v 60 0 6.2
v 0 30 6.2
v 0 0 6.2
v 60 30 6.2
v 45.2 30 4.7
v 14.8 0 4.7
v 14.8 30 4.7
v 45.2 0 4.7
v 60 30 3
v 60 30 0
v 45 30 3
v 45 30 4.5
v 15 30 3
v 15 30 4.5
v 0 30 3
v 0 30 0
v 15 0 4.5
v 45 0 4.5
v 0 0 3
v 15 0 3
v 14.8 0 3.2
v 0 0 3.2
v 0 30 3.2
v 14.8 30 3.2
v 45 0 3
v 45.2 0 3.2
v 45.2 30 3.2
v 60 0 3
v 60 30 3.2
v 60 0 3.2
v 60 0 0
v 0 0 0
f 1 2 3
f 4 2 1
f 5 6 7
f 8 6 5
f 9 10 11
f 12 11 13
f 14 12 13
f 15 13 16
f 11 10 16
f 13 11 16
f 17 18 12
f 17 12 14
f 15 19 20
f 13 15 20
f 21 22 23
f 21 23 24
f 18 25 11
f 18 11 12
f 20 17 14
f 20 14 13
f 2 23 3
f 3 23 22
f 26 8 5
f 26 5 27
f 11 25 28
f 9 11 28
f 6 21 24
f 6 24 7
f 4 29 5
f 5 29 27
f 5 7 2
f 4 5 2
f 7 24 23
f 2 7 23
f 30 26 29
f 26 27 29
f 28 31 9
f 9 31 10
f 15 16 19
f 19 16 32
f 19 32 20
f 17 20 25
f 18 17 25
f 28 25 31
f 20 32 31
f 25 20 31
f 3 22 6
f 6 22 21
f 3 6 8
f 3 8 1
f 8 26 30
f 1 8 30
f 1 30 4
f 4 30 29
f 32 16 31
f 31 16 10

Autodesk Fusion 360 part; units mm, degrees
sketch "Sketch2" plane through (0, 0, 0) normal (0, 0, 1) x (1, 0, 0)
  line L0 (0, 0) -> (60, 0)
  line L1 (60, 0) -> (60, 30)
  line L2 (60, 30) -> (0, 30)
  line L3 (0, 30) -> (0, 0)
  dimension "d8" = 60
  dimension "d9" = 30
extrude "Extrude5" add sketch "Sketch2" along normal blind 3 makes body 1
sketch "Sketch6" plane through (0, 0, 0) normal (0, 1, 0) x (1, 0, 0)
  line L0 (45, -4.5) -> (15, -4.5)
  line L1 (15, -4.5) -> (15, -1.5)
  line L2 (15, -1.5) -> (45, -1.5)
  line L3 (45, -1.5) -> (45, -4.5)
  line L4 (45, -4.5) -> (15, -1.5) construction
  line L5 (15, -4.5) -> (45, -1.5) construction
  line L6 (0, -3) -> (60, -3)
  point P0 (30, -3)
  dimension "d36" = 30
  dimension "d37" = 3
extrude "Extrude6" add sketch "Sketch6" along normal blind 30 contours L0 L1 L3 L6 bodies 1
ref_plane "WorkPlane2" through (0, 0, 3.2) normal (0, 0, 1) x (1, 0, 0)
sketch "Sketch7" plane through (0, 0, 3.2) normal (0, 0, 1) x (1, 0, 0)
  line L0 (0, 0) -> (60, 0)
  line L1 (60, 0) -> (60, 30)
  line L2 (60, 30) -> (0, 30)
  line L3 (0, 30) -> (0, 0)
  dimension "d41" = 60
  dimension "d42" = 30
extrude "Extrude7" add sketch "Sketch7" along normal blind 3 separate body makes body 2
sketch "Sketch8" plane through (0, 0, 0) normal (0, 1, 0) x (1, 0, 0)
  line L0 (45.2, -1.7) -> (14.8, -1.7)
  line L1 (14.8, -1.7) -> (14.8, -4.7)
  line L2 (14.8, -4.7) -> (45.2, -4.7)
  line L3 (45.2, -4.7) -> (45.2, -1.7)
  line L4 (45.2, -1.7) -> (14.8, -4.7) construction
  line L5 (14.8, -1.7) -> (45.2, -4.7) construction
  line L6 (0, -3.2) -> (60, -3.2)
  point P0 (30, -3.2)
  dimension "d45" = 30.4
  dimension "d46" = 3
extrude "Extrude8" cut sketch "Sketch8" along normal blind 30 contours L1 L2 L3 L6 bodies 2
equation "platelength = 60 mm"
equation "platewidth = 30 mm"
equation "plateheight = 3 mm"
equation "clearence = 0.2 mm"
equation "d8 = platelength"
equation "d9 = platewidth"
equation "d34 = plateheight"
equation "d37 = plateheight"
equation "d38 = platewidth"
equation "d40 = plateheight + clearence"
equation "d41 = platelength"
equation "d42 = platewidth"
equation "d43 = plateheight"
equation "d45 = 30 mm + ( 2 * clearence )"
equation "d46 = plateheight"
equation "d47 = platewidth"
